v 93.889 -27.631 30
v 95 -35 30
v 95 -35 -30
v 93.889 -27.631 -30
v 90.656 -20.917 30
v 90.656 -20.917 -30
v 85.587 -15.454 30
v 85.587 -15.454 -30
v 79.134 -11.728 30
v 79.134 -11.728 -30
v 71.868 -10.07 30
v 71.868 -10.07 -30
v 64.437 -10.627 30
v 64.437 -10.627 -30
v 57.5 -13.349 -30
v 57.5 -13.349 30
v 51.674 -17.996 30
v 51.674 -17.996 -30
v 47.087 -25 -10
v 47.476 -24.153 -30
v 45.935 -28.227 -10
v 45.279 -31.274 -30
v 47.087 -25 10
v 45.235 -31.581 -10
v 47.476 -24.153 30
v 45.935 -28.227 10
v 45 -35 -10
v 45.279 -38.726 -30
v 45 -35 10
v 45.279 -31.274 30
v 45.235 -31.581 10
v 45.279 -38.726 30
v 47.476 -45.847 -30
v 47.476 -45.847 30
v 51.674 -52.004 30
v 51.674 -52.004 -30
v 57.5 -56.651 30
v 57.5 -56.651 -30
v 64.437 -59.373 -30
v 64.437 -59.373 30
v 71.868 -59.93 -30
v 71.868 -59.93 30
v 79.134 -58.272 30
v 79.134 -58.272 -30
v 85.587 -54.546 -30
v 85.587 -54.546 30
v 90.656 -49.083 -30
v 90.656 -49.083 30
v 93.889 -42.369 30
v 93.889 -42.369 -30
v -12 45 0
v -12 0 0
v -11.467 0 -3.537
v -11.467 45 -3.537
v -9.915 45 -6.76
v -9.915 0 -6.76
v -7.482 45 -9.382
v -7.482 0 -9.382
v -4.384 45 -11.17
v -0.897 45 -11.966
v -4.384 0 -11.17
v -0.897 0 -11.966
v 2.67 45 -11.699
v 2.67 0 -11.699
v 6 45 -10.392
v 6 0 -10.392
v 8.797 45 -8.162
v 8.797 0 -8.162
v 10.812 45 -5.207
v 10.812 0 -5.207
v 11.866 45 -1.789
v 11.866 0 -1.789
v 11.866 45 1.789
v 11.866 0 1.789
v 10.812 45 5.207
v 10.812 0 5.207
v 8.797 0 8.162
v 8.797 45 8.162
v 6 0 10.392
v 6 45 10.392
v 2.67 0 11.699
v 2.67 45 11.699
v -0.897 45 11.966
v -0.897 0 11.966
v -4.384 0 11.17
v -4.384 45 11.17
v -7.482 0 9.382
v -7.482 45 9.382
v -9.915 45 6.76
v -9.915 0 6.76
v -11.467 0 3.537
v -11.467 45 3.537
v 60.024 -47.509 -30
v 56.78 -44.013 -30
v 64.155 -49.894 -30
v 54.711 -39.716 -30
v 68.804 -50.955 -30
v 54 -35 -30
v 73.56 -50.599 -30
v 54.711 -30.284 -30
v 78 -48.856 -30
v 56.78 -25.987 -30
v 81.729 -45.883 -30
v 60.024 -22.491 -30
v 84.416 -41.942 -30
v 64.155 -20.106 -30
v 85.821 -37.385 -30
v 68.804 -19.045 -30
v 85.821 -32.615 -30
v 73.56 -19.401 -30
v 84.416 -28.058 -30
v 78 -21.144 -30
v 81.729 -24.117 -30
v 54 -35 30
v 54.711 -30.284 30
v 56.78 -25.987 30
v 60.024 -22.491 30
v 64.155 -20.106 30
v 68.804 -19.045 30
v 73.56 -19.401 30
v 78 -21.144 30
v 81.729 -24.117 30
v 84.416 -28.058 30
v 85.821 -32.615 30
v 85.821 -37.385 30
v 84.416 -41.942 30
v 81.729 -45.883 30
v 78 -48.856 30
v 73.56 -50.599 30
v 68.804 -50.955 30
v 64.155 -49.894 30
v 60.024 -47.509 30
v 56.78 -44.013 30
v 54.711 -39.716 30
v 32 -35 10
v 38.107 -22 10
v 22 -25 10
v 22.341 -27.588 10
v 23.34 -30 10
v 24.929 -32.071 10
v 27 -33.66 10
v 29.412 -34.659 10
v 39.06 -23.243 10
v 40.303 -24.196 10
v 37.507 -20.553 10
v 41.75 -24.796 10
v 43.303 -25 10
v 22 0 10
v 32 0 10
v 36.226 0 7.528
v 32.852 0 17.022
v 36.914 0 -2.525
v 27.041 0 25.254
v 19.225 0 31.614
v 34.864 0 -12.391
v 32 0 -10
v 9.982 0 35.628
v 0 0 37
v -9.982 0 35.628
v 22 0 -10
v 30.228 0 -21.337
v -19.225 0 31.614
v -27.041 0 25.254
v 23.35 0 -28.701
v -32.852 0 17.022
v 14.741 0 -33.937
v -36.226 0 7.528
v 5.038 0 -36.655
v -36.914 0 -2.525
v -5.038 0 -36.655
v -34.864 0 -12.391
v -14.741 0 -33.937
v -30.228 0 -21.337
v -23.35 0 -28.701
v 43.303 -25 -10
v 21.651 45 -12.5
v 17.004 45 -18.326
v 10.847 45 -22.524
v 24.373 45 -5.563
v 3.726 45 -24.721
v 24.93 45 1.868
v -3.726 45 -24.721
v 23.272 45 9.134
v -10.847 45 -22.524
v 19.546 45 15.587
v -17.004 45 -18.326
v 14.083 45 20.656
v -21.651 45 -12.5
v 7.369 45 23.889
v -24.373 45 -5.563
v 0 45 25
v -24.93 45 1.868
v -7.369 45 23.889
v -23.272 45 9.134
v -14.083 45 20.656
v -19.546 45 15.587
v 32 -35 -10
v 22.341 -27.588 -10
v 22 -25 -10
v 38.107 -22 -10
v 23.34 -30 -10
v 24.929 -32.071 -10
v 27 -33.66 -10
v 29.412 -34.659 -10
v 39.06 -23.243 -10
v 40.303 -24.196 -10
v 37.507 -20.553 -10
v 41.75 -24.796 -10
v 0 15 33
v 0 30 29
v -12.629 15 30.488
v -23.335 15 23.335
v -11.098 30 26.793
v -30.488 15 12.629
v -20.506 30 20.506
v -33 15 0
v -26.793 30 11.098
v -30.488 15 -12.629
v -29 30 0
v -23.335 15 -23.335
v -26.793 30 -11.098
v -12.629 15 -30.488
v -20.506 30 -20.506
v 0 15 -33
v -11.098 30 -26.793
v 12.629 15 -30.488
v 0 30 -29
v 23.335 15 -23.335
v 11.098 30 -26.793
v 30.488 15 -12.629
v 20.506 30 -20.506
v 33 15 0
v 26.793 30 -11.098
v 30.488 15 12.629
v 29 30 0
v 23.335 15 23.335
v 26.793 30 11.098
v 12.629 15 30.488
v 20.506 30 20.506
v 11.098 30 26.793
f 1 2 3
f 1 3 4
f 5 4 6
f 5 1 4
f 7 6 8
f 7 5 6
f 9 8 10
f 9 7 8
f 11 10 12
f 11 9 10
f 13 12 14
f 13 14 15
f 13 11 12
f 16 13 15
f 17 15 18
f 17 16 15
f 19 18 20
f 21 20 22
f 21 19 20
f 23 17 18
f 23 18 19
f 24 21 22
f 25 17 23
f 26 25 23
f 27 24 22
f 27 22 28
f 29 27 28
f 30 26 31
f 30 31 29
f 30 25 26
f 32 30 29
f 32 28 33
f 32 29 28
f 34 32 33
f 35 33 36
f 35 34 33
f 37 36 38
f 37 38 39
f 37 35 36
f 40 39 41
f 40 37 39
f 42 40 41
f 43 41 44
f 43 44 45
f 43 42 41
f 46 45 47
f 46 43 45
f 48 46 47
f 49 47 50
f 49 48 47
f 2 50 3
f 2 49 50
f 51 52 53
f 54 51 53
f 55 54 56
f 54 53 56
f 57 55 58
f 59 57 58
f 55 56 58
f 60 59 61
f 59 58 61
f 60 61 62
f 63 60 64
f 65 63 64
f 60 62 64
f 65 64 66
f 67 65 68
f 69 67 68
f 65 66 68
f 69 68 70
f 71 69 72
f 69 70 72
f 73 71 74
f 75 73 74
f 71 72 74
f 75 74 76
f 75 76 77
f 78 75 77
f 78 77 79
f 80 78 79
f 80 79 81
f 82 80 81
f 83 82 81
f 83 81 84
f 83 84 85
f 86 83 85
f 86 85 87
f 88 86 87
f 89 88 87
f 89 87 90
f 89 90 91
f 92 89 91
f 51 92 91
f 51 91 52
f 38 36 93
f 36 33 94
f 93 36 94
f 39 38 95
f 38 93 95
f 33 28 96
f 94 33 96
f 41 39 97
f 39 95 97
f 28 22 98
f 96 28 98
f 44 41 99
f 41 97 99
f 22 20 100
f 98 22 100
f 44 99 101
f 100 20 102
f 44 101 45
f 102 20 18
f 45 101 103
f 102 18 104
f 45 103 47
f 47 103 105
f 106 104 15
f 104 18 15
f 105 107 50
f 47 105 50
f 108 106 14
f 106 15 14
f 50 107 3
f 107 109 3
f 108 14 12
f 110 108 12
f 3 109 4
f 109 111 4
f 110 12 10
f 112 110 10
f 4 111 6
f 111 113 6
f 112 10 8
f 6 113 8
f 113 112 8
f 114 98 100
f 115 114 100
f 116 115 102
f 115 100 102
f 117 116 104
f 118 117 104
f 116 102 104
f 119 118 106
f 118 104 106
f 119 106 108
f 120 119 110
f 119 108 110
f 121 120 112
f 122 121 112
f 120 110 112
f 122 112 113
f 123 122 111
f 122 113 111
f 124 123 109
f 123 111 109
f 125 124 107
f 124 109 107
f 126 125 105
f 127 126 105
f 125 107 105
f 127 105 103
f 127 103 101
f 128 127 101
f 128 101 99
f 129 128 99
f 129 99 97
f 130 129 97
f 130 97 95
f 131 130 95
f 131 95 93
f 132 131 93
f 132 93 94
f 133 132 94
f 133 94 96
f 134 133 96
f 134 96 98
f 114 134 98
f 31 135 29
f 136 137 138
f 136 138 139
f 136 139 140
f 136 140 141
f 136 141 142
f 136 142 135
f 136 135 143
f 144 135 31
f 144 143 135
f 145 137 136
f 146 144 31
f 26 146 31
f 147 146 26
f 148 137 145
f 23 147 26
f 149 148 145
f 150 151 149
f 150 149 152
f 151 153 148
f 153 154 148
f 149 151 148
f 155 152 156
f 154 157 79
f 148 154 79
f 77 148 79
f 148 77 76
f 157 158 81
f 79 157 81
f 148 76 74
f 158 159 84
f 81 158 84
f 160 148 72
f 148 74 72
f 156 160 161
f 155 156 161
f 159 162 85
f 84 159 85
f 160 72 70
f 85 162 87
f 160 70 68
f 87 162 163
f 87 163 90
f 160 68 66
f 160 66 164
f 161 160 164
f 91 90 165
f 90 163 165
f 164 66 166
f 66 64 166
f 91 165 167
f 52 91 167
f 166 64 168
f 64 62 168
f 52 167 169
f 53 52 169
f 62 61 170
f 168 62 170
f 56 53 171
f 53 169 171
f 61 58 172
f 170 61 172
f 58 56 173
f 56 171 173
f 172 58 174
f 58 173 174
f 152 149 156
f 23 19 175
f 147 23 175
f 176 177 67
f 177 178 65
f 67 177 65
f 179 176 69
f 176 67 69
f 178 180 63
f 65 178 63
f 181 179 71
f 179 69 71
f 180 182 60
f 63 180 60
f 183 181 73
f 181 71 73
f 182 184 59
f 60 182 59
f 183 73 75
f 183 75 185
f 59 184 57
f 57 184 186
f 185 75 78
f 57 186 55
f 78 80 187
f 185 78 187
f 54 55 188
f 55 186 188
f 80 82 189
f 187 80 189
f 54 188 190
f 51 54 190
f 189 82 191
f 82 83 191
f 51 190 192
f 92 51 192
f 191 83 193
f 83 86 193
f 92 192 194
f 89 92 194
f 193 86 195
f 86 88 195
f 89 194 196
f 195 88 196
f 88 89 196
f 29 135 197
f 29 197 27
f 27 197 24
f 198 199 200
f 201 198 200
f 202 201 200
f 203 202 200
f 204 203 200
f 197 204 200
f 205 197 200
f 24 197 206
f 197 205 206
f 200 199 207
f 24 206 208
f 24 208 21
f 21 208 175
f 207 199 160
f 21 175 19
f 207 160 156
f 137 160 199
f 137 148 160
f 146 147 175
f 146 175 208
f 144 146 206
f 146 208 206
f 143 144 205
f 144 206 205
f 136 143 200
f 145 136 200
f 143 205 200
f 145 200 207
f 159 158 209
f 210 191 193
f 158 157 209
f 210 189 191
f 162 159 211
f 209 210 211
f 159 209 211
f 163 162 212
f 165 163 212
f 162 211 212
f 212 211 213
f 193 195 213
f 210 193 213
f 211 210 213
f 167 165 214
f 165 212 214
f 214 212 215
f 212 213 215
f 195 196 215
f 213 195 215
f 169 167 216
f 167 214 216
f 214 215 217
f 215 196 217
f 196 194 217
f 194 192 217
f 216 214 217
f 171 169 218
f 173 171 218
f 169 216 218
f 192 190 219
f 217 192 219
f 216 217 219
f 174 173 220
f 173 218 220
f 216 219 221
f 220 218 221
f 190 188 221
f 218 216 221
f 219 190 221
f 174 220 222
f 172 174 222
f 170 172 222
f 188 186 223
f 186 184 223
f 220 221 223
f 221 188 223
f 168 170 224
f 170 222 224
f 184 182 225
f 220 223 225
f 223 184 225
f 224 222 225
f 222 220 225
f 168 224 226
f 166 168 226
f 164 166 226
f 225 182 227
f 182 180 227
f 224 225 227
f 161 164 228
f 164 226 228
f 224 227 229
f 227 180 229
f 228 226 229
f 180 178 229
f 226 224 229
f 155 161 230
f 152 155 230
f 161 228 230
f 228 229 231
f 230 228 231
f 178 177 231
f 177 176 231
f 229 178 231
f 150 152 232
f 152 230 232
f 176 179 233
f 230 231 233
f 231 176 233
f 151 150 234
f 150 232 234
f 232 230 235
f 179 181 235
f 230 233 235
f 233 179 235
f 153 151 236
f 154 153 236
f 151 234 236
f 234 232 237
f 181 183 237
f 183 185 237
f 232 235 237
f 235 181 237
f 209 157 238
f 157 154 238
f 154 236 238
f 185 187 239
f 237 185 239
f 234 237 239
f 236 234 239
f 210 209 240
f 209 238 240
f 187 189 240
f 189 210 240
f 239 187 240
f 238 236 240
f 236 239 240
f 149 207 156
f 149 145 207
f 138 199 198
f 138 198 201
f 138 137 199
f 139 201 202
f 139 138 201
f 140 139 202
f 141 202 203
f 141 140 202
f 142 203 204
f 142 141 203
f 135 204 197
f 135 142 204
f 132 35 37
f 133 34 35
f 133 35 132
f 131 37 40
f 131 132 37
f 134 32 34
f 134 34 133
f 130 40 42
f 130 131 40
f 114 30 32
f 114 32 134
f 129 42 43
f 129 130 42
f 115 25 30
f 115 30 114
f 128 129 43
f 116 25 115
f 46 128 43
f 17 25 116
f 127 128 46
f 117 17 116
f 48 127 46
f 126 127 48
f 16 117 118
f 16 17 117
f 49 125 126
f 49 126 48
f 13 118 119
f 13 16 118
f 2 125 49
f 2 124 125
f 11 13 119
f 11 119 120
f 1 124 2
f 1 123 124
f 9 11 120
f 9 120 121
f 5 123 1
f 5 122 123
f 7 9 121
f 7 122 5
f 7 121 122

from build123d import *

# Parameters (mm, degrees)
SKETCH2_R             = 25
BOSS_EXTRUDE1_DEPTH   = 30
BOSS_EXTRUDE2_DEPTH   = 10
FILLET1_R             = 10
FILLET2_R             = 6
F_1_0MM_DOWEL_HOLE1_D = 24
F_1_0MM_DOWEL_HOLE2_D = 32


with BuildPart() as part:
    # Sketch1 → Revolve1 (revolve)
    with BuildSketch(Plane.XY, mode=Mode.PRIVATE) as revolve1_sk:
        Polygon((0, 0), (37, 0), (25, 45), (0, 45), align=None)
    revolve(revolve1_sk.sketch.rotate(Axis((0, 45, 0), (0, -1, 0)), 90), axis=Axis((0, 45, 0), (0, -1, 0)))



with BuildPart() as body_2:
    # Sketch2 → Boss-Extrude1 (new, symmetric)
    with BuildSketch(Plane.XY):
        with Locations((70, -35)):
            Circle(SKETCH2_R)
    extrude(amount=BOSS_EXTRUDE1_DEPTH, both=True)


with BuildPart() as part_1:
    add(part.part)

    add(body_2.part)  # Boss-Extrude2 merges body 2
    # Sketch3 → Boss-Extrude2 (add, symmetric)
    with BuildSketch(Plane.XY):
        Polygon((22, 0), (22, -35), (54.188700462, -35), (54.188700462, -25), (38.698729811, -25), (32, 0), align=None)
    extrude(amount=BOSS_EXTRUDE2_DEPTH, both=True)

    # Fillet1
    fillet1_edges = [part_1.edges().sort_by_distance(p)[0] for p in [
        (22, -35, 0),
    ]]
    fillet(fillet1_edges, radius=FILLET1_R)

    # Fillet2
    fillet2_edges = [part_1.edges().sort_by_distance(p)[0] for p in [
        (38.698729811, -25, 0),
    ]]
    fillet(fillet2_edges, radius=FILLET2_R)

    # Ø1.0mm Dowel Hole1 (through all)
    with Locations(Plane(origin=(0, 45, 0), x_dir=(1, 0, 0), z_dir=(0, 1, 0))):
        with Locations((0, 0)):
            Hole(F_1_0MM_DOWEL_HOLE1_D / 2)

    # Ø1.0mm Dowel Hole2 (through all)
    with Locations(Plane.XY.offset(30)):
        with Locations((70, -35)):
            Hole(F_1_0MM_DOWEL_HOLE2_D / 2)


solid = part_1.part
